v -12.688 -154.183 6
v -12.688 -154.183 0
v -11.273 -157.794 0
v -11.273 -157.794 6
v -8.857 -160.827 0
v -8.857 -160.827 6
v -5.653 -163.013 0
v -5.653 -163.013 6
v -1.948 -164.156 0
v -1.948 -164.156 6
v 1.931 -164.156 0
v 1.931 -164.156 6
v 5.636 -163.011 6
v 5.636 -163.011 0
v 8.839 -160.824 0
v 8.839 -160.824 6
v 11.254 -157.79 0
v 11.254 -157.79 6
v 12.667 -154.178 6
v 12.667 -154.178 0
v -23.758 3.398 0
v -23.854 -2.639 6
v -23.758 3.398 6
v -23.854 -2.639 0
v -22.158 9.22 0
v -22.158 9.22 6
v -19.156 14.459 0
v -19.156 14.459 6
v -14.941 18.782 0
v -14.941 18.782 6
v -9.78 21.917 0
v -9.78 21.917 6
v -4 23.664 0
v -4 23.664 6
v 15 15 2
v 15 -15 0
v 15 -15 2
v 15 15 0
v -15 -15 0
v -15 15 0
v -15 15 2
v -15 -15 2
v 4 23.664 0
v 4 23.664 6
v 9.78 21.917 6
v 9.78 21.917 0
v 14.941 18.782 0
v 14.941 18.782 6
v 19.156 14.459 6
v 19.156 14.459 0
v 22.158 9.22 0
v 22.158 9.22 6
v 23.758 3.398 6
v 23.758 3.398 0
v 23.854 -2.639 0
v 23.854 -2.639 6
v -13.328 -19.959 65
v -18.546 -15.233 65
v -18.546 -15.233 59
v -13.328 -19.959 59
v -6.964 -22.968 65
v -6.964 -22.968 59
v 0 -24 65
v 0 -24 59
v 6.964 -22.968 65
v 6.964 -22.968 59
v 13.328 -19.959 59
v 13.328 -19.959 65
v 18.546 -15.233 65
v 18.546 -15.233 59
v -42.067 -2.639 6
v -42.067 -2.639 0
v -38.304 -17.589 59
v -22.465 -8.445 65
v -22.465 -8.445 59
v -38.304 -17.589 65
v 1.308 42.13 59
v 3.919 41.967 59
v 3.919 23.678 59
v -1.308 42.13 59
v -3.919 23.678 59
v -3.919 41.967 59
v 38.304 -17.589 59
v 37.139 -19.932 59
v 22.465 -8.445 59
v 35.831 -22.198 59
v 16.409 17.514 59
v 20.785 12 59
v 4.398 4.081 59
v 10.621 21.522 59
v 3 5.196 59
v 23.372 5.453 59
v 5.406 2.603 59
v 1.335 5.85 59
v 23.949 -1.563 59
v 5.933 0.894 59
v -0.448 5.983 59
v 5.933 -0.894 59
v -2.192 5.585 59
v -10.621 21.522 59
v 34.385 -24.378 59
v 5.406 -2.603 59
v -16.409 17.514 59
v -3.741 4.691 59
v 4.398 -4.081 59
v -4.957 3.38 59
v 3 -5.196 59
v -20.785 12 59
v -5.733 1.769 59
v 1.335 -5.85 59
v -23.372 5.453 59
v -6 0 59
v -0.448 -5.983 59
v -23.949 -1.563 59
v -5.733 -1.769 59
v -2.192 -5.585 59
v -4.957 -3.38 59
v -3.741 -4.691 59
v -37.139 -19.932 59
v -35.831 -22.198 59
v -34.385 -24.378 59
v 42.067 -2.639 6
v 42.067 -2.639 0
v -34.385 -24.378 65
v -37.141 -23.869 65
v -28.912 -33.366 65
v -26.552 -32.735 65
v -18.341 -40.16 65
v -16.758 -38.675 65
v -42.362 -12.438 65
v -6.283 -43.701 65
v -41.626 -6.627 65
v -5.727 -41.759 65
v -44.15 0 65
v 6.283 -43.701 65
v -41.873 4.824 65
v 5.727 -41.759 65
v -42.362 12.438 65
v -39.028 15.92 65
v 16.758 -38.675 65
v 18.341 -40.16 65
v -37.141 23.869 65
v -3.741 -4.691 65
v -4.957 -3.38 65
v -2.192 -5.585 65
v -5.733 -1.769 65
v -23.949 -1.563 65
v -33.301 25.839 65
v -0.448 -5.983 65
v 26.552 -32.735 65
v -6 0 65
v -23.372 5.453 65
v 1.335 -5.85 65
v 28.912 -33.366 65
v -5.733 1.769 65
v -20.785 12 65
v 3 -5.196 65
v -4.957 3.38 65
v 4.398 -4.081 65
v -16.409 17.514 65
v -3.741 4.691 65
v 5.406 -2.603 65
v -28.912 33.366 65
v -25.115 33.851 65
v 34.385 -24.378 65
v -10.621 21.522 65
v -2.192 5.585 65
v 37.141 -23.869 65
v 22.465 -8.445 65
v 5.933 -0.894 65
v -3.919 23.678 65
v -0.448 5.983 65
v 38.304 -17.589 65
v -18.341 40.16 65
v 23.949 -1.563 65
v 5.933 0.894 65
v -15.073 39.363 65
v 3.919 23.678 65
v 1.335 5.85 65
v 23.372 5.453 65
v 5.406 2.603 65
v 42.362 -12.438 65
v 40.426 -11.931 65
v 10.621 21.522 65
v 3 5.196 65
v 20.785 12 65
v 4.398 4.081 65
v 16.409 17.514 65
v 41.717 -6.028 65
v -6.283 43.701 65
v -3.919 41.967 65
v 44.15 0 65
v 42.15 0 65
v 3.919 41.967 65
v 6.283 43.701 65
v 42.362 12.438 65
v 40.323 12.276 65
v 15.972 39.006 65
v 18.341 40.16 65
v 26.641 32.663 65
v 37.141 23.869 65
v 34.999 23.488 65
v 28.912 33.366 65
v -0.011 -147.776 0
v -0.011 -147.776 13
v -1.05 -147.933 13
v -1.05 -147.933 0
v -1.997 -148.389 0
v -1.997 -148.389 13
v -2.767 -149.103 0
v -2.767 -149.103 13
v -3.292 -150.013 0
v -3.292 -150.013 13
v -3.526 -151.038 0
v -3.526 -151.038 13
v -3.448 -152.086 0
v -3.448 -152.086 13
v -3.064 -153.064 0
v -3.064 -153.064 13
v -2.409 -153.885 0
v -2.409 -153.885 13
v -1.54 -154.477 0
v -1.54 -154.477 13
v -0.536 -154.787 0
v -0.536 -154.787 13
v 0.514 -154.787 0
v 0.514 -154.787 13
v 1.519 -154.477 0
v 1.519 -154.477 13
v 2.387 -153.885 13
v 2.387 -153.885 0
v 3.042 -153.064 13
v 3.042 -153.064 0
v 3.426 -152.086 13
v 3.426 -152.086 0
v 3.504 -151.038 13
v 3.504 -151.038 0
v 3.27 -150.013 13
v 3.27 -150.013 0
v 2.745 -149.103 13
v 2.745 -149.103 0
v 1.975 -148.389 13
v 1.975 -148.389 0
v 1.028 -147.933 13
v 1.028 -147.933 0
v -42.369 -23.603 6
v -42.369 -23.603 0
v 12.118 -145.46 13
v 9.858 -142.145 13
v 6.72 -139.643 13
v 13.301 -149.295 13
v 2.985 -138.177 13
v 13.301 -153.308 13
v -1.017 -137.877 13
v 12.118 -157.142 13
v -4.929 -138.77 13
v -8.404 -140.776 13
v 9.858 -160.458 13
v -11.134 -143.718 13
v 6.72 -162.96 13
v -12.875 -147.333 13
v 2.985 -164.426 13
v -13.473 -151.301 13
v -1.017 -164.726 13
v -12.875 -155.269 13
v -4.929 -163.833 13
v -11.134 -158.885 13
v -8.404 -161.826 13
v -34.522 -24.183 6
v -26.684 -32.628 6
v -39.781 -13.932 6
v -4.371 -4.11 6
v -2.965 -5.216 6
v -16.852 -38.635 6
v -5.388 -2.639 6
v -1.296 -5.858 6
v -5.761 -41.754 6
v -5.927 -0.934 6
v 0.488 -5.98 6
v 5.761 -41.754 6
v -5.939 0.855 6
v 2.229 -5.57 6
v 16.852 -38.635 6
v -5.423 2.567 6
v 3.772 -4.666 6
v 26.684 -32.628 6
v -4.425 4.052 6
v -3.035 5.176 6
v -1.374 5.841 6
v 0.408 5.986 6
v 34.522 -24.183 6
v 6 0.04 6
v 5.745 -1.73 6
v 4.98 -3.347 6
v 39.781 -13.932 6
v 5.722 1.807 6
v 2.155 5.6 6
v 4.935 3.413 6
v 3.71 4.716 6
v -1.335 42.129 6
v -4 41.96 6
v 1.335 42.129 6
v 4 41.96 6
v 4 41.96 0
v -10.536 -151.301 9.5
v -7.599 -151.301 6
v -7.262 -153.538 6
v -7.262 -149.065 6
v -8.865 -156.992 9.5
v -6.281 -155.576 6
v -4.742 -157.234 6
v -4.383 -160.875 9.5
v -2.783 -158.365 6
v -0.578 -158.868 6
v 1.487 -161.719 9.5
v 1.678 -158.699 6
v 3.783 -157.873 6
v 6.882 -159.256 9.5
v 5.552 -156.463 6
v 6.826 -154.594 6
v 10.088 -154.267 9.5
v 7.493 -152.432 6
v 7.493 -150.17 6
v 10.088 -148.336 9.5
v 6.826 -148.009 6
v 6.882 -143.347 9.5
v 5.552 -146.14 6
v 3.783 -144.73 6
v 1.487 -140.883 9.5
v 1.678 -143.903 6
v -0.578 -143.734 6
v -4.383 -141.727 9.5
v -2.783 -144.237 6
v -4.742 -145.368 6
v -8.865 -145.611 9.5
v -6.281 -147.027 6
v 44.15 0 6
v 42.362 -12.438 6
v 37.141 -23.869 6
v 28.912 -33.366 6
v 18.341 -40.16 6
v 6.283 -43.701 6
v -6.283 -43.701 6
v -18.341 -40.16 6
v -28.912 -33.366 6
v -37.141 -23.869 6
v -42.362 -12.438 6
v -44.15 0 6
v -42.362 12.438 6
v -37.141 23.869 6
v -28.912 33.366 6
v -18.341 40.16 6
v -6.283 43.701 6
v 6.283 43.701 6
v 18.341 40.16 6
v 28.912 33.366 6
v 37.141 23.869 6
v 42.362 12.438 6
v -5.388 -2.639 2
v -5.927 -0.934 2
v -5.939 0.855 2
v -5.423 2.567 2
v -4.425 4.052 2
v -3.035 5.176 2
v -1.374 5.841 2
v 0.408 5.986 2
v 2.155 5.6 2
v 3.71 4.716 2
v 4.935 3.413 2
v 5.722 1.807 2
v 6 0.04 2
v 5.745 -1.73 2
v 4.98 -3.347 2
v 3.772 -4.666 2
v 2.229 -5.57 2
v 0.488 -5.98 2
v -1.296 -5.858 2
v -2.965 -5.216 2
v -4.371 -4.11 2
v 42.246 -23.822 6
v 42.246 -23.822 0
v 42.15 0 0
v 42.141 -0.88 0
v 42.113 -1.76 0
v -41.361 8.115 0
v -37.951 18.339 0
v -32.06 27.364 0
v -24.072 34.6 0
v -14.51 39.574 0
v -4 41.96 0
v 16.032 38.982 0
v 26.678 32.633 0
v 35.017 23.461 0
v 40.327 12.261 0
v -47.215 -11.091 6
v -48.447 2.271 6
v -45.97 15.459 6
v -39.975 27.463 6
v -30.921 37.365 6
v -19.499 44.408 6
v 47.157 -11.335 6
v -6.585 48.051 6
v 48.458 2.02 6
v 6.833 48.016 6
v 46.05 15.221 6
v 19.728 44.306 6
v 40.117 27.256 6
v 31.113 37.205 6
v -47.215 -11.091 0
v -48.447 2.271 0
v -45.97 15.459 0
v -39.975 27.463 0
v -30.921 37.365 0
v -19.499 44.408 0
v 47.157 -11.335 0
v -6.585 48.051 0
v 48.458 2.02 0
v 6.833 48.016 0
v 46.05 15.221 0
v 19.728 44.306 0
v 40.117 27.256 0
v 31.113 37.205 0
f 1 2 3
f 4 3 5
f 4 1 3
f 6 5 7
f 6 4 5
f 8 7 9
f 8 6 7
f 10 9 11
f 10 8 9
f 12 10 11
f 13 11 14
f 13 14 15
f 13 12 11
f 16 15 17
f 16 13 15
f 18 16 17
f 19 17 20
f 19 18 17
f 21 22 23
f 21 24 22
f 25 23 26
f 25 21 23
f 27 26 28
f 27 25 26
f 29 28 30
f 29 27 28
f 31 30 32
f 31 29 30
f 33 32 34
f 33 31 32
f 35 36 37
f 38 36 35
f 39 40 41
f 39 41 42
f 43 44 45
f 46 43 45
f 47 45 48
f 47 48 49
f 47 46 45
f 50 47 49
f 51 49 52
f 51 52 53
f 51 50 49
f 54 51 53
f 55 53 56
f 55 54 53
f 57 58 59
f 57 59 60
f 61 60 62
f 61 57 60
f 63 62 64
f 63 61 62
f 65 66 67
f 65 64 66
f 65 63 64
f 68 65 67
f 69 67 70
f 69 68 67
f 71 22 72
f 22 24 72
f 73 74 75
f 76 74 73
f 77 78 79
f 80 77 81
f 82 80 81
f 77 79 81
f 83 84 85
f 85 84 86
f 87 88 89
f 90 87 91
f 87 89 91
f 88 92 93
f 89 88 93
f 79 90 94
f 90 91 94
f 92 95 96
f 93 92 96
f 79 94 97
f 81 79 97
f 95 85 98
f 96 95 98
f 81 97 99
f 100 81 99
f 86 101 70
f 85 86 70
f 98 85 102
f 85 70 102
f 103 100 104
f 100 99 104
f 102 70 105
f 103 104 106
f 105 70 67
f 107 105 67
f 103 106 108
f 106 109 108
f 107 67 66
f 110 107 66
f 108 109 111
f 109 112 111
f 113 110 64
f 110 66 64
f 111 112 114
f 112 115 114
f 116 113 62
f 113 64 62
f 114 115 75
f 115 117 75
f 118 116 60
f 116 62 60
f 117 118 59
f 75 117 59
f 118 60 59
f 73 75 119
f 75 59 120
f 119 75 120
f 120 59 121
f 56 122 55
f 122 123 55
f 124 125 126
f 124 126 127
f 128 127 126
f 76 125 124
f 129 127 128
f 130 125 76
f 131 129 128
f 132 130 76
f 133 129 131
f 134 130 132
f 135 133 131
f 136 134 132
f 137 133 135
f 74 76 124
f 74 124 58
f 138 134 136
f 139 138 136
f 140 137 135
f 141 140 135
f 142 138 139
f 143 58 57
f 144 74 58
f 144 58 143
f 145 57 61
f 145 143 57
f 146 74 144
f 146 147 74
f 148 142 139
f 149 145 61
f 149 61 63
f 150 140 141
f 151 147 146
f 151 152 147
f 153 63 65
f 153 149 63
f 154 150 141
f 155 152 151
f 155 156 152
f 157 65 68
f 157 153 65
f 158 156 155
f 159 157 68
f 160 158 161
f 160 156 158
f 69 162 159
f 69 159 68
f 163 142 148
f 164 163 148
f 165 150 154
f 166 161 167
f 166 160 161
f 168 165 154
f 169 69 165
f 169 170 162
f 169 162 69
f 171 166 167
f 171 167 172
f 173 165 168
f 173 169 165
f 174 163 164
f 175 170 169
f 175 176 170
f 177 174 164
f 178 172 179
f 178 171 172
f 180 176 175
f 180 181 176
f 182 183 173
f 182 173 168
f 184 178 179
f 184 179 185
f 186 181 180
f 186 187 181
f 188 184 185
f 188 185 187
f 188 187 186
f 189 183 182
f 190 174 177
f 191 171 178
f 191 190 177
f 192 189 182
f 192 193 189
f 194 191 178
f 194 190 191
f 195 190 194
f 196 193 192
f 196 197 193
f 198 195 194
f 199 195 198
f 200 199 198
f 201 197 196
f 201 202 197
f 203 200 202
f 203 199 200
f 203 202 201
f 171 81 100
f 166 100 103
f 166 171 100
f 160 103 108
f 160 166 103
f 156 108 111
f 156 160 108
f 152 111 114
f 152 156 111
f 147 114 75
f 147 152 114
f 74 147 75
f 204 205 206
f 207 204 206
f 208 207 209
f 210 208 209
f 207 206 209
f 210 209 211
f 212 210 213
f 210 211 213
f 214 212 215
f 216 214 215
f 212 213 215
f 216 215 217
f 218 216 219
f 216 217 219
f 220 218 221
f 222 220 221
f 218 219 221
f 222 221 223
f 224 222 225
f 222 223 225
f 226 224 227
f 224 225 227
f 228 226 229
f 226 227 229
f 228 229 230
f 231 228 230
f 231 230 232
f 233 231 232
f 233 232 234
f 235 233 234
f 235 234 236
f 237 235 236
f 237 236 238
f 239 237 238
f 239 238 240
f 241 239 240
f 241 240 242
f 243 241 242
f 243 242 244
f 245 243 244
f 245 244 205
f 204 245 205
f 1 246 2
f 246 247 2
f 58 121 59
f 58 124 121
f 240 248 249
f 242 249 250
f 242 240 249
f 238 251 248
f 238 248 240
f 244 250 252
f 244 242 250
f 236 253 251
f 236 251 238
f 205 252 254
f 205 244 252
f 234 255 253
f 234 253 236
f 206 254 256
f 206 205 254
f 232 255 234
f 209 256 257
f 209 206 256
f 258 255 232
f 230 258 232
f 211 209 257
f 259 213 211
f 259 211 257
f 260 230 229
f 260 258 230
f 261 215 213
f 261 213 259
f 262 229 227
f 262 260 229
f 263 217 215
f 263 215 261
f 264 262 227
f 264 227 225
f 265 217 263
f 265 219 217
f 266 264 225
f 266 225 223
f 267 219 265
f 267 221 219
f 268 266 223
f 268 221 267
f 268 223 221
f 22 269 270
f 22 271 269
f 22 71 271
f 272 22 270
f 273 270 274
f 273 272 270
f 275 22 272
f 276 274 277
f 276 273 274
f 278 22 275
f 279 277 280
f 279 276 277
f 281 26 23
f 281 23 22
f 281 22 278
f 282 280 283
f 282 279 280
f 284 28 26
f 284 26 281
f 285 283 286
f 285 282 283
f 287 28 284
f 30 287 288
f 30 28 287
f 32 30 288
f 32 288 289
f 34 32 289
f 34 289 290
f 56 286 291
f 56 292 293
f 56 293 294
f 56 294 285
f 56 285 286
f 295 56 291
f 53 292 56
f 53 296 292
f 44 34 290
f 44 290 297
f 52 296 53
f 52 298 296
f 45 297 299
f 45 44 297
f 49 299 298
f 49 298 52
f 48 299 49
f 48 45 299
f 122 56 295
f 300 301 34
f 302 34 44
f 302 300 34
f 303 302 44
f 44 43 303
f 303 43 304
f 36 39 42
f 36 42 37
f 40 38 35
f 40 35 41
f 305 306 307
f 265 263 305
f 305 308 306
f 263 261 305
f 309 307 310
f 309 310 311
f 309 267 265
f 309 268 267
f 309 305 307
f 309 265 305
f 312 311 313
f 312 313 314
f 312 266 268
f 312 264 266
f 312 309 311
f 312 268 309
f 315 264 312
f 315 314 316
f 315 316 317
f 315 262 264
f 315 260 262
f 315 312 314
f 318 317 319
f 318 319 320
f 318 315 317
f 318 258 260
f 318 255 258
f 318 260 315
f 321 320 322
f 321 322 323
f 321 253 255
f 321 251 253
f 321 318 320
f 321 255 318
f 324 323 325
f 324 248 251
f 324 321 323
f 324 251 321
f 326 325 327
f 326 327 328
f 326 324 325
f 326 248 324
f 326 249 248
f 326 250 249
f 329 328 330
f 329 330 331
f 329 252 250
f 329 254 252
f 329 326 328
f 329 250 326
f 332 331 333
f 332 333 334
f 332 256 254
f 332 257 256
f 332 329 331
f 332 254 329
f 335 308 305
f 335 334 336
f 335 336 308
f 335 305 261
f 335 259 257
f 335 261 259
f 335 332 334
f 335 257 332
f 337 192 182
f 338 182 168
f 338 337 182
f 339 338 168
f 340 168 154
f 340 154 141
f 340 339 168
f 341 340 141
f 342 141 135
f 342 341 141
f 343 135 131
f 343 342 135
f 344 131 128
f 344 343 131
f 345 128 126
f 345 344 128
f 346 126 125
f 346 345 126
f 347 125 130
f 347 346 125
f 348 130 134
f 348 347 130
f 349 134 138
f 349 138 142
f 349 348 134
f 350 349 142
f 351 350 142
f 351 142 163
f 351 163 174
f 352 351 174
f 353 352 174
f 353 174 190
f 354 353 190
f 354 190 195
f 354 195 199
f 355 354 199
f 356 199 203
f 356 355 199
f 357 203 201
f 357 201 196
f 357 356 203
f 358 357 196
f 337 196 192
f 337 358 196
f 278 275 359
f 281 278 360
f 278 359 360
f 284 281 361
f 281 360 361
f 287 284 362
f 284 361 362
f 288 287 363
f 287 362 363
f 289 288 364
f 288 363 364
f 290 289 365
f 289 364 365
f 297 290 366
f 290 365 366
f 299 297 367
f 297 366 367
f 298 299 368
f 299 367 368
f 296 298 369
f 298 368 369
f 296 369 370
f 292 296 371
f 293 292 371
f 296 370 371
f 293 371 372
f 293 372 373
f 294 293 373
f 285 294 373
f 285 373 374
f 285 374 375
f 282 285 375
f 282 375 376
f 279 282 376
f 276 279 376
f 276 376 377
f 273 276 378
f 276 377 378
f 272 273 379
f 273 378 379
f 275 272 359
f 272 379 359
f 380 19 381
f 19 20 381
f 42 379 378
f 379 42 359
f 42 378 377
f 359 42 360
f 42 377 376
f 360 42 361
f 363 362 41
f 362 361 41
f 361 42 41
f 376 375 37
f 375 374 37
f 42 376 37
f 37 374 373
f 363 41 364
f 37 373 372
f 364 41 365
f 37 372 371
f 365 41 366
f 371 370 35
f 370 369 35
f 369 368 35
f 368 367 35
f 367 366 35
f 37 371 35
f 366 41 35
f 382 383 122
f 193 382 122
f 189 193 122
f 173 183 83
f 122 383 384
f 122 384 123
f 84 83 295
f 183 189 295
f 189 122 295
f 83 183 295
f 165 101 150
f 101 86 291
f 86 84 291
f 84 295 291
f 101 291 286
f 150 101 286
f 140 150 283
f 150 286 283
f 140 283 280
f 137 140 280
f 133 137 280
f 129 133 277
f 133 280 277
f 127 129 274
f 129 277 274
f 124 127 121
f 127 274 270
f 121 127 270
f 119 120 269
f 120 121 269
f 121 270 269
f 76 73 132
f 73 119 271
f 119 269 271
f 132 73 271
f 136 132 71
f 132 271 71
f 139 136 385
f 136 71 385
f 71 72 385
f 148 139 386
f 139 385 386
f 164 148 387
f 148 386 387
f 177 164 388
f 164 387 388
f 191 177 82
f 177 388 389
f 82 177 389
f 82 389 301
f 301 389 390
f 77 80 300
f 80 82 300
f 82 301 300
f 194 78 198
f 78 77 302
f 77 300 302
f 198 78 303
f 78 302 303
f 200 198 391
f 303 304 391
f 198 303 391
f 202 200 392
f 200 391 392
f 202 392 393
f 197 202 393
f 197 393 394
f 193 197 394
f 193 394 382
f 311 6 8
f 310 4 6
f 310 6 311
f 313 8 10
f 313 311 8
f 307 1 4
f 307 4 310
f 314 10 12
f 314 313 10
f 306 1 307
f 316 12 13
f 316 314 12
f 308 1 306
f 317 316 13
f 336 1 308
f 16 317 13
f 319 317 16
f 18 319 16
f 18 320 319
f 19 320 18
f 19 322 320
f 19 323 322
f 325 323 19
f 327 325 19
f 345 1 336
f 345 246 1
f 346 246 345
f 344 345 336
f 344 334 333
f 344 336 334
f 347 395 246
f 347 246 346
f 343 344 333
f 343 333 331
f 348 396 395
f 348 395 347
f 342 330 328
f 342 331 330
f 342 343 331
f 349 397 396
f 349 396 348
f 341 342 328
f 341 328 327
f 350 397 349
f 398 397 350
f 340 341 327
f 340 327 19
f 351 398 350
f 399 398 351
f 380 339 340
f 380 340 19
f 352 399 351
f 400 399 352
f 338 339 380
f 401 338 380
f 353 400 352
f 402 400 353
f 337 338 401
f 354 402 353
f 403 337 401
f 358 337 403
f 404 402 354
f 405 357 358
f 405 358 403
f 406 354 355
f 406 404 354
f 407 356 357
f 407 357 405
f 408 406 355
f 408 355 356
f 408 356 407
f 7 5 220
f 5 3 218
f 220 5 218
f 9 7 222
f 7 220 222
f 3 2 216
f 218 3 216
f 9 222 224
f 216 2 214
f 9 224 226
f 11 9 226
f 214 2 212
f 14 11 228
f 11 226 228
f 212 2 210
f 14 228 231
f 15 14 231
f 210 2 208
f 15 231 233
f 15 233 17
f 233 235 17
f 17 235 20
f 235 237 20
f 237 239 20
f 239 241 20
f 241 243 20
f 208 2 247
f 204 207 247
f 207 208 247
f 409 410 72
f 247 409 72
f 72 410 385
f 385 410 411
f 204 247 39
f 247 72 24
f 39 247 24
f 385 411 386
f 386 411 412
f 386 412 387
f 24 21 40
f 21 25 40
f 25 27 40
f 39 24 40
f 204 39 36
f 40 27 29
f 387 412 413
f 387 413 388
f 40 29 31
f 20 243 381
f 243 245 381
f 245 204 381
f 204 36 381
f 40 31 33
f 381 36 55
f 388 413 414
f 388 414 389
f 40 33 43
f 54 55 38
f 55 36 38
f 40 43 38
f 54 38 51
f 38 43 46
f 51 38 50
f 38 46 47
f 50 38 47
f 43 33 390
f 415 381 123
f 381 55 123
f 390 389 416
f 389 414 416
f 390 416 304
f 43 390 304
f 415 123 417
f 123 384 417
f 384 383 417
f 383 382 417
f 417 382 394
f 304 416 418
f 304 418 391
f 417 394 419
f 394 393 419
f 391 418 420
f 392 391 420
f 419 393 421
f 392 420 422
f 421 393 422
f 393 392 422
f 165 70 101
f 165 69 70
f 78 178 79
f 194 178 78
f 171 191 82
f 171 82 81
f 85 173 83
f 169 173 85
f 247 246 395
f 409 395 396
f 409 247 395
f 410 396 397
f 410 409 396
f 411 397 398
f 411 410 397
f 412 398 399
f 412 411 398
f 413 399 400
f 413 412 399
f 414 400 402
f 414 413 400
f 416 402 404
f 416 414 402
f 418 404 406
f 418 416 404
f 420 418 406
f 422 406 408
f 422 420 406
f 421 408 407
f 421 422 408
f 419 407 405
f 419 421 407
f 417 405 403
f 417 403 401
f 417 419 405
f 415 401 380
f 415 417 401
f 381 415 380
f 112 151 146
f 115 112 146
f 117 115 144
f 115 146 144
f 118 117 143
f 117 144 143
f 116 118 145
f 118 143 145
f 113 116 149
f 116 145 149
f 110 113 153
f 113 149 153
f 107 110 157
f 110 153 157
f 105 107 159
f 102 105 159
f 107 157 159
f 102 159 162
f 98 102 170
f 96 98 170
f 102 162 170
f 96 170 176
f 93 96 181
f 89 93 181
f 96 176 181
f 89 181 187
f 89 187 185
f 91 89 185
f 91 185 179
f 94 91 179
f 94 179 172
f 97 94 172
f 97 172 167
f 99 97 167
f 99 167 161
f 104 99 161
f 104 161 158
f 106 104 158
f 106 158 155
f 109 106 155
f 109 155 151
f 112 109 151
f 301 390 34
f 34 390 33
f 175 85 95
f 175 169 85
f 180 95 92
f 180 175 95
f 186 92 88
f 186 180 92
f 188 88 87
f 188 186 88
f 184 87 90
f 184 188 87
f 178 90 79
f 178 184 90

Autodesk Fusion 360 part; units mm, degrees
sketch "Sketch1" plane through (0, 0, 0) normal (0, 0, 1) x (1, 0, 0)
  circle A0 centre (0, 0) radius 48.5
  circle A1 centre (0, 0) radius 44.15
  circle A2 centre (0, 0) radius 42.15
  circle A3 centre (0, 0) radius 24
  line L0 (-4, 0) -> (4, 0)
  line L1 (4, 0) -> (4, 46)
  line L2 (4, 46) -> (-4, 46)
  line L3 (-4, 46) -> (-4, 0)
  line L4 (-2, 3.4641) -> (-41.8372, -19.5359)
  line L5 (-41.8372, -19.5359) -> (-37.8372, -26.4641)
  line L6 (-37.8372, -26.4641) -> (2, -3.4641)
  line L7 (2, -3.4641) -> (-2, 3.4641)
  line L8 (-2, -3.4641) -> (37.8372, -26.4641)
  line L9 (37.8372, -26.4641) -> (41.8372, -19.5359)
  line L10 (41.8372, -19.5359) -> (2, 3.4641)
  line L11 (2, 3.4641) -> (-2, -3.4641)
  circle A4 centre (0, 0) radius 6
  line L12 (15, 15) -> (-15, 15)
  line L13 (-15, 15) -> (-15, -15)
  line L14 (-15, -15) -> (15, -15)
  line L15 (15, -15) -> (15, 15)
  line L16 (15, 15) -> (-15, -15) construction
  line L17 (-15, 15) -> (15, -15) construction
  dimension "d1" = 97
  dimension "d2" = 88.3
  dimension "d3" = 84.3
  dimension "d4" = 48
  dimension "d6" = 360
  dimension "d7" = 12
  dimension "d12" = 30
  dimension "d13" = 30
extrude "Extrude1" add sketch "Sketch1" along normal blind 6 contours A0 | A1 L1 L2 L3 | A1 L8 L9 L10 | A2 A3 L1 L3 | A2 A3 L8 L10 | A1 L4 L5 L6 | A2 A3 L4 L6 | L1 L10 A4 L12 L15 | L1 L3 A4 L12 | L8 L10 A4 L15 | L3 L4 A4 L12 L13 | L6 L8 A4 L13 L14 L15 | L4 L6 A4 L13 makes body 1 at (48.4397, -2.4175, 4) makes body 2 at (-3.113, 29.8622, 0) makes body 3 at (-0.1495, 11.9944, 0) makes body 4 at (-27.4179, -12.2352, 0) makes body 5 at (27.4179, -12.2352, 0)
extrude "Extrude6" add sketch "Sketch1" along normal blind 6 contours A3 L1 L3 L12 | A3 L1 L10 L12 L15 | A3 L8 L10 L15 | A3 L3 L4 L12 L13 | A3 L6 L8 L13 L14 L15 | A3 L4 L6 L13 bodies 3 4 2 5
sketch "Sketch2" plane through (0, 0, 0) normal (0, 0, 1) x (1, 0, 0)
extrude "Extrude2" add sketch "Sketch1" along normal blind 65 contours A1 A2 L1 L10 | A1 A2 L1 L3 | A1 A2 L8 L10 | A1 A2 L3 L4 | A1 A2 L6 L8 | A1 A2 L4 L6 bodies 1 3
sketch "Sketch4" plane through (0, 0, 65) normal (0, 0, 1) x (-1, 0, 0)
  circle A0 centre (0, 0) radius 42.15
  circle A1 centre (0, 0) radius 44.15
  line L0 (-3.9193, -45.9529) -> (3.9193, -45.9529)
  line L1 (3.9193, -45.9529) -> (3.9193, 45.9529)
  line L2 (3.9193, 45.9529) -> (-3.9193, 45.9529)
  line L3 (-3.9193, 45.9529) -> (-3.9193, -45.9529)
  line L4 (-3.9193, -45.9529) -> (3.9193, 45.9529) construction
  line L5 (3.9193, -45.9529) -> (-3.9193, 45.9529) construction
  line L6 (41.7561, 19.5823) -> (37.8368, 26.3707)
  line L7 (-37.8368, -26.3707) -> (41.7561, 19.5823)
  line L8 (37.8368, 26.3707) -> (-41.7561, -19.5823)
  line L9 (-41.7561, -19.5823) -> (-37.8368, -26.3707)
  line L10 (-37.8368, 26.3707) -> (-41.7561, 19.5823)
  line L11 (41.7561, -19.5823) -> (-37.8368, 26.3707)
  line L12 (-41.7561, 19.5823) -> (37.8368, -26.3707)
  line L13 (37.8368, -26.3707) -> (41.7561, -19.5823)
  circle A2 centre (0, 0) radius 6
  circle A3 centre (0, 0) radius 24
  line L14 (-15, 15) -> (15, 15)
  line L15 (15, 15) -> (15, -15)
  line L16 (15, -15) -> (-15, -15)
  line L17 (-15, -15) -> (-15, 15)
  line L18 (-15, 15) -> (15, -15) construction
  line L19 (15, 15) -> (-15, -15) construction
  dimension "d20" = 360
  dimension "d21" = 12
  dimension "d22" = 48
  dimension "d25" = 30
  dimension "d26" = 30
extrude "Extrude4" add sketch "Sketch4" against normal blind 6 contours A0 L7 L8 A3 | L7 L11 A3 L15 | L7 L8 A3 L15 | L11 L12 A3 L15 | L1 L8 A3 L14 L15 | A0 L1 L3 A3 | L1 L12 A3 L15 L16 | L1 L3 A3 L14 | L1 L3 A3 L16 | A0 L11 L12 A3 | L3 L11 A3 L14 L17 | L3 L7 A3 L16 L17 | L11 L12 A3 L17 | L7 L8 A3 L17 | L8 L12 A3 L17 picked at (24.3429, 17.5763) picked at (3.0501, -29.8698) picked at (-27.393, 12.2934) bodies 1
sketch "Sketch5" plane through (0, 0, 65) normal (0, 0, 1) x (-1, 0, 0)
  arc A0 (3.9193, -41.9674) -> (38.3045, 17.5895) centre (0, 0) ccw
  line L0 (3.9193, -41.9674) -> (3.9193, -23.6778)
  arc A1 (3.9193, -23.6778) -> (22.4652, 8.4447) centre (0, 0) ccw
  line L1 (22.4652, 8.4447) -> (38.3045, 17.5895)
  line L2 (34.3852, 24.3779) -> (18.5459, 15.2331)
  line L3 (-18.5459, 15.2331) -> (-34.3852, 24.3779)
  arc A2 (34.3852, 24.3779) -> (-34.3852, 24.3779) centre (0, 0) ccw
  line L4 (-38.3045, 17.5895) -> (-22.4652, 8.4447)
  arc A3 (-22.4652, 8.4447) -> (-3.9193, -23.6778) centre (0, 0) ccw
  line L5 (-3.9193, -23.6778) -> (-3.9193, -41.9674)
  arc A4 (-38.3045, 17.5895) -> (-3.9193, -41.9674) centre (0, 0) ccw
  circle A5 centre (0, 0) radius 44.15
  arc A6 (18.5459, 15.2331) -> (-18.5459, 15.2331) centre (0, 0) ccw
  line L6 (15, -15) -> (-15, -15)
  line L7 (-15, -15) -> (-15, 15)
  line L8 (-15, 15) -> (15, 15)
  line L9 (15, 15) -> (15, -15)
extrude "Extrude5" add sketch "Sketch4" against normal blind 3 contours L7 L11 L15 | L1 L7 L8 L11 A2 L15 | L1 L7 L11 L12 A2 L15 | L1 L8 L14 L15 | L7 L11 A2 | L1 L12 L15 L16 | L1 L3 L8 L11 A2 L14 | L1 L8 A2 | L1 L3 L7 L12 A2 L16 | L1 L12 A2 | L3 L11 L14 L17 | L3 L7 L16 L17 | L3 L8 L11 L12 A2 L17 | L3 L11 A2 | L3 L7 L8 L12 A2 L17 | L3 L7 A2 | L8 L12 L17 | L8 L12 A2 bodies 1
extrude "Extrude7" add sketch "Sketch4" against normal blind 6 contours L7 L11 L15 | L1 L7 L8 L11 A2 L15 | L1 L7 L11 L12 A2 L15 | L1 L8 L14 L15 | L7 L11 A2 | L1 L12 L15 L16 | L1 L3 L8 L11 A2 L14 | L1 L8 A2 | L1 L3 L7 L12 A2 L16 | L1 L12 A2 | L3 L11 L14 L17 | L3 L7 L16 L17 | L3 L8 L11 L12 A2 L17 | L3 L11 A2 | L3 L7 L8 L12 A2 L17 | L3 L7 A2 | L8 L12 L17 | L8 L12 A2 bodies 1
sketch "Sketch8" plane through (0, 0, 0) normal (0, 0, 1) x (1, 0, 0)
sketch "Sketch9" plane through (0, 0, 0) normal (0, 0, 1) x (1, 0, 0)
  line L0 (10, 10) -> (-10, 10)
  line L1 (-10, 10) -> (-10, -10)
  line L2 (-10, -10) -> (10, -10)
  line L3 (10, -10) -> (10, 10)
  line L4 (10, 10) -> (-10, -10) construction
  line L5 (-10, 10) -> (10, -10) construction
  dimension "d33" = 20
sketch "Sketch10" plane through (0, 0, 0) normal (0, 0, 1) x (1, 0, 0)
sketch "Sketch13" plane through (0, 0, 0) normal (0, 0, -1) x (1, 0, 0)
  arc A0 (4, -41.9598) -> (38.3382, 17.5158) centre (0, 0) ccw
  line L0 (4, -41.9598) -> (4, -23.6643)
  arc A1 (4, -23.6643) -> (22.4939, 8.3681) centre (0, 0) ccw
  line L1 (22.4939, 8.3681) -> (38.3382, 17.5158)
  arc A2 (-38.3382, 17.5158) -> (-4, -41.9598) centre (0, 0) ccw
  line L2 (-38.3382, 17.5158) -> (-22.4939, 8.3681)
  arc A3 (-22.4939, 8.3681) -> (-4, -23.6643) centre (0, 0) ccw
  line L3 (-4, -23.6643) -> (-4, -41.9598)
  circle A4 centre (0, 0) radius 6
  line L4 (34.3382, 24.444) -> (18.4939, 15.2963)
  arc A5 (18.4939, 15.2963) -> (-18.4939, 15.2963) centre (0, 0) ccw
  line L5 (-18.4939, 15.2963) -> (-34.3382, 24.444)
  arc A6 (34.3382, 24.444) -> (-34.3382, 24.444) centre (0, 0) ccw
  circle A7 centre (0, 0) radius 48.5
sketch "Sketch14" plane through (0, 0, 0) normal (0, 0, -1) x (1, 0, 0)
  line L0 (0, 0) -> (0, 210)
  line L1 (0, 210) -> (47.0531, 2.6393)
  line L2 (47.0531, 2.6393) -> (-47.1343, 2.6393)
  line L3 (-47.1343, 2.6393) -> (0, 210)
  dimension "d54" = 210
extrude "Extrude8" add sketch "Sketch14" against normal blind 6 bodies 1
fillet "Fillet1" radius 13 1 edges at (0, -210, 3) on bodies 1
extrude "Extrude9" cut sketch "Sketch9" sketch "Sketch1" along normal blind 2 of sketch 2 contours L1 L10 A4 L12 L15 | L1 L3 A4 L12 | L8 L10 A4 L15 | L3 L4 A4 L12 L13 | L6 L8 A4 L13 L14 L15 | L4 L6 A4 L13 bodies 1
extrude "Extrude10" cut sketch "Sketch13" against normal blind 11 contours A4 bodies 1
sketch "Sketch15" plane through (0, 0, 0) normal (0, 0, -1) x (1, 0, 0)
  line L0 (-15, 15) -> (15, 15)
  line L1 (15, 15) -> (15, -15)
  line L2 (15, -15) -> (-15, -15)
  line L3 (-15, -15) -> (-15, 15)
  arc A0 (12.6668, 154.1781) -> (-12.6876, 154.1828) centre (-0.0109, 151.3013) ccw
  line L4 (-12.6876, 154.1828) -> (-42.3691, 23.6032)
  arc A1 (-42.3691, 23.6032) -> (42.2464, 23.8222) centre (0, 0) ccw
  line L5 (42.2464, 23.8222) -> (12.6668, 154.1781)
  arc A2 (-23.8544, 2.6393) -> (-4, -23.6643) centre (0, 0) ccw
  line L6 (-4, -23.6643) -> (-4, -41.9598)
  arc A3 (-42.0673, 2.6393) -> (-4, -41.9598) centre (0, 0) ccw
  line L7 (-42.0673, 2.6393) -> (-23.8544, 2.6393)
  line L8 (23.8544, 2.6393) -> (42.0673, 2.6393)
  arc A4 (4, -41.9598) -> (42.0673, 2.6393) centre (0, 0) ccw
  line L9 (4, -41.9598) -> (4, -23.6643)
  arc A5 (4, -23.6643) -> (23.8544, 2.6393) centre (0, 0) ccw
sketch "Sketch16" plane through (0, 0, 6) normal (0, 0, 1) x (-1, 0, 0)
  arc A0 (12.6876, 154.1828) -> (-12.6668, 154.1781) centre (0.0109, 151.3013) ccw
  line L0 (-12.6668, 154.1781) -> (-42.2464, 23.8222)
  arc A1 (-42.2464, 23.8222) -> (42.3691, 23.6032) centre (0, 0) ccw
  line L1 (42.3691, 23.6032) -> (12.6876, 154.1828)
  circle A2 centre (0, 0) radius 44.15
  circle A3 centre (0.0109, 151.3013) radius 7.5884
extrude "Extrude11" add sketch "Sketch16" along normal blind 7 draft 40 contours A3 bodies 1
hole "Hole7" at (-0.0109, -151.3013, 0) direction (0, 0, 1) diameter 7.05 depth 22 tip angle 180 bodies 1
